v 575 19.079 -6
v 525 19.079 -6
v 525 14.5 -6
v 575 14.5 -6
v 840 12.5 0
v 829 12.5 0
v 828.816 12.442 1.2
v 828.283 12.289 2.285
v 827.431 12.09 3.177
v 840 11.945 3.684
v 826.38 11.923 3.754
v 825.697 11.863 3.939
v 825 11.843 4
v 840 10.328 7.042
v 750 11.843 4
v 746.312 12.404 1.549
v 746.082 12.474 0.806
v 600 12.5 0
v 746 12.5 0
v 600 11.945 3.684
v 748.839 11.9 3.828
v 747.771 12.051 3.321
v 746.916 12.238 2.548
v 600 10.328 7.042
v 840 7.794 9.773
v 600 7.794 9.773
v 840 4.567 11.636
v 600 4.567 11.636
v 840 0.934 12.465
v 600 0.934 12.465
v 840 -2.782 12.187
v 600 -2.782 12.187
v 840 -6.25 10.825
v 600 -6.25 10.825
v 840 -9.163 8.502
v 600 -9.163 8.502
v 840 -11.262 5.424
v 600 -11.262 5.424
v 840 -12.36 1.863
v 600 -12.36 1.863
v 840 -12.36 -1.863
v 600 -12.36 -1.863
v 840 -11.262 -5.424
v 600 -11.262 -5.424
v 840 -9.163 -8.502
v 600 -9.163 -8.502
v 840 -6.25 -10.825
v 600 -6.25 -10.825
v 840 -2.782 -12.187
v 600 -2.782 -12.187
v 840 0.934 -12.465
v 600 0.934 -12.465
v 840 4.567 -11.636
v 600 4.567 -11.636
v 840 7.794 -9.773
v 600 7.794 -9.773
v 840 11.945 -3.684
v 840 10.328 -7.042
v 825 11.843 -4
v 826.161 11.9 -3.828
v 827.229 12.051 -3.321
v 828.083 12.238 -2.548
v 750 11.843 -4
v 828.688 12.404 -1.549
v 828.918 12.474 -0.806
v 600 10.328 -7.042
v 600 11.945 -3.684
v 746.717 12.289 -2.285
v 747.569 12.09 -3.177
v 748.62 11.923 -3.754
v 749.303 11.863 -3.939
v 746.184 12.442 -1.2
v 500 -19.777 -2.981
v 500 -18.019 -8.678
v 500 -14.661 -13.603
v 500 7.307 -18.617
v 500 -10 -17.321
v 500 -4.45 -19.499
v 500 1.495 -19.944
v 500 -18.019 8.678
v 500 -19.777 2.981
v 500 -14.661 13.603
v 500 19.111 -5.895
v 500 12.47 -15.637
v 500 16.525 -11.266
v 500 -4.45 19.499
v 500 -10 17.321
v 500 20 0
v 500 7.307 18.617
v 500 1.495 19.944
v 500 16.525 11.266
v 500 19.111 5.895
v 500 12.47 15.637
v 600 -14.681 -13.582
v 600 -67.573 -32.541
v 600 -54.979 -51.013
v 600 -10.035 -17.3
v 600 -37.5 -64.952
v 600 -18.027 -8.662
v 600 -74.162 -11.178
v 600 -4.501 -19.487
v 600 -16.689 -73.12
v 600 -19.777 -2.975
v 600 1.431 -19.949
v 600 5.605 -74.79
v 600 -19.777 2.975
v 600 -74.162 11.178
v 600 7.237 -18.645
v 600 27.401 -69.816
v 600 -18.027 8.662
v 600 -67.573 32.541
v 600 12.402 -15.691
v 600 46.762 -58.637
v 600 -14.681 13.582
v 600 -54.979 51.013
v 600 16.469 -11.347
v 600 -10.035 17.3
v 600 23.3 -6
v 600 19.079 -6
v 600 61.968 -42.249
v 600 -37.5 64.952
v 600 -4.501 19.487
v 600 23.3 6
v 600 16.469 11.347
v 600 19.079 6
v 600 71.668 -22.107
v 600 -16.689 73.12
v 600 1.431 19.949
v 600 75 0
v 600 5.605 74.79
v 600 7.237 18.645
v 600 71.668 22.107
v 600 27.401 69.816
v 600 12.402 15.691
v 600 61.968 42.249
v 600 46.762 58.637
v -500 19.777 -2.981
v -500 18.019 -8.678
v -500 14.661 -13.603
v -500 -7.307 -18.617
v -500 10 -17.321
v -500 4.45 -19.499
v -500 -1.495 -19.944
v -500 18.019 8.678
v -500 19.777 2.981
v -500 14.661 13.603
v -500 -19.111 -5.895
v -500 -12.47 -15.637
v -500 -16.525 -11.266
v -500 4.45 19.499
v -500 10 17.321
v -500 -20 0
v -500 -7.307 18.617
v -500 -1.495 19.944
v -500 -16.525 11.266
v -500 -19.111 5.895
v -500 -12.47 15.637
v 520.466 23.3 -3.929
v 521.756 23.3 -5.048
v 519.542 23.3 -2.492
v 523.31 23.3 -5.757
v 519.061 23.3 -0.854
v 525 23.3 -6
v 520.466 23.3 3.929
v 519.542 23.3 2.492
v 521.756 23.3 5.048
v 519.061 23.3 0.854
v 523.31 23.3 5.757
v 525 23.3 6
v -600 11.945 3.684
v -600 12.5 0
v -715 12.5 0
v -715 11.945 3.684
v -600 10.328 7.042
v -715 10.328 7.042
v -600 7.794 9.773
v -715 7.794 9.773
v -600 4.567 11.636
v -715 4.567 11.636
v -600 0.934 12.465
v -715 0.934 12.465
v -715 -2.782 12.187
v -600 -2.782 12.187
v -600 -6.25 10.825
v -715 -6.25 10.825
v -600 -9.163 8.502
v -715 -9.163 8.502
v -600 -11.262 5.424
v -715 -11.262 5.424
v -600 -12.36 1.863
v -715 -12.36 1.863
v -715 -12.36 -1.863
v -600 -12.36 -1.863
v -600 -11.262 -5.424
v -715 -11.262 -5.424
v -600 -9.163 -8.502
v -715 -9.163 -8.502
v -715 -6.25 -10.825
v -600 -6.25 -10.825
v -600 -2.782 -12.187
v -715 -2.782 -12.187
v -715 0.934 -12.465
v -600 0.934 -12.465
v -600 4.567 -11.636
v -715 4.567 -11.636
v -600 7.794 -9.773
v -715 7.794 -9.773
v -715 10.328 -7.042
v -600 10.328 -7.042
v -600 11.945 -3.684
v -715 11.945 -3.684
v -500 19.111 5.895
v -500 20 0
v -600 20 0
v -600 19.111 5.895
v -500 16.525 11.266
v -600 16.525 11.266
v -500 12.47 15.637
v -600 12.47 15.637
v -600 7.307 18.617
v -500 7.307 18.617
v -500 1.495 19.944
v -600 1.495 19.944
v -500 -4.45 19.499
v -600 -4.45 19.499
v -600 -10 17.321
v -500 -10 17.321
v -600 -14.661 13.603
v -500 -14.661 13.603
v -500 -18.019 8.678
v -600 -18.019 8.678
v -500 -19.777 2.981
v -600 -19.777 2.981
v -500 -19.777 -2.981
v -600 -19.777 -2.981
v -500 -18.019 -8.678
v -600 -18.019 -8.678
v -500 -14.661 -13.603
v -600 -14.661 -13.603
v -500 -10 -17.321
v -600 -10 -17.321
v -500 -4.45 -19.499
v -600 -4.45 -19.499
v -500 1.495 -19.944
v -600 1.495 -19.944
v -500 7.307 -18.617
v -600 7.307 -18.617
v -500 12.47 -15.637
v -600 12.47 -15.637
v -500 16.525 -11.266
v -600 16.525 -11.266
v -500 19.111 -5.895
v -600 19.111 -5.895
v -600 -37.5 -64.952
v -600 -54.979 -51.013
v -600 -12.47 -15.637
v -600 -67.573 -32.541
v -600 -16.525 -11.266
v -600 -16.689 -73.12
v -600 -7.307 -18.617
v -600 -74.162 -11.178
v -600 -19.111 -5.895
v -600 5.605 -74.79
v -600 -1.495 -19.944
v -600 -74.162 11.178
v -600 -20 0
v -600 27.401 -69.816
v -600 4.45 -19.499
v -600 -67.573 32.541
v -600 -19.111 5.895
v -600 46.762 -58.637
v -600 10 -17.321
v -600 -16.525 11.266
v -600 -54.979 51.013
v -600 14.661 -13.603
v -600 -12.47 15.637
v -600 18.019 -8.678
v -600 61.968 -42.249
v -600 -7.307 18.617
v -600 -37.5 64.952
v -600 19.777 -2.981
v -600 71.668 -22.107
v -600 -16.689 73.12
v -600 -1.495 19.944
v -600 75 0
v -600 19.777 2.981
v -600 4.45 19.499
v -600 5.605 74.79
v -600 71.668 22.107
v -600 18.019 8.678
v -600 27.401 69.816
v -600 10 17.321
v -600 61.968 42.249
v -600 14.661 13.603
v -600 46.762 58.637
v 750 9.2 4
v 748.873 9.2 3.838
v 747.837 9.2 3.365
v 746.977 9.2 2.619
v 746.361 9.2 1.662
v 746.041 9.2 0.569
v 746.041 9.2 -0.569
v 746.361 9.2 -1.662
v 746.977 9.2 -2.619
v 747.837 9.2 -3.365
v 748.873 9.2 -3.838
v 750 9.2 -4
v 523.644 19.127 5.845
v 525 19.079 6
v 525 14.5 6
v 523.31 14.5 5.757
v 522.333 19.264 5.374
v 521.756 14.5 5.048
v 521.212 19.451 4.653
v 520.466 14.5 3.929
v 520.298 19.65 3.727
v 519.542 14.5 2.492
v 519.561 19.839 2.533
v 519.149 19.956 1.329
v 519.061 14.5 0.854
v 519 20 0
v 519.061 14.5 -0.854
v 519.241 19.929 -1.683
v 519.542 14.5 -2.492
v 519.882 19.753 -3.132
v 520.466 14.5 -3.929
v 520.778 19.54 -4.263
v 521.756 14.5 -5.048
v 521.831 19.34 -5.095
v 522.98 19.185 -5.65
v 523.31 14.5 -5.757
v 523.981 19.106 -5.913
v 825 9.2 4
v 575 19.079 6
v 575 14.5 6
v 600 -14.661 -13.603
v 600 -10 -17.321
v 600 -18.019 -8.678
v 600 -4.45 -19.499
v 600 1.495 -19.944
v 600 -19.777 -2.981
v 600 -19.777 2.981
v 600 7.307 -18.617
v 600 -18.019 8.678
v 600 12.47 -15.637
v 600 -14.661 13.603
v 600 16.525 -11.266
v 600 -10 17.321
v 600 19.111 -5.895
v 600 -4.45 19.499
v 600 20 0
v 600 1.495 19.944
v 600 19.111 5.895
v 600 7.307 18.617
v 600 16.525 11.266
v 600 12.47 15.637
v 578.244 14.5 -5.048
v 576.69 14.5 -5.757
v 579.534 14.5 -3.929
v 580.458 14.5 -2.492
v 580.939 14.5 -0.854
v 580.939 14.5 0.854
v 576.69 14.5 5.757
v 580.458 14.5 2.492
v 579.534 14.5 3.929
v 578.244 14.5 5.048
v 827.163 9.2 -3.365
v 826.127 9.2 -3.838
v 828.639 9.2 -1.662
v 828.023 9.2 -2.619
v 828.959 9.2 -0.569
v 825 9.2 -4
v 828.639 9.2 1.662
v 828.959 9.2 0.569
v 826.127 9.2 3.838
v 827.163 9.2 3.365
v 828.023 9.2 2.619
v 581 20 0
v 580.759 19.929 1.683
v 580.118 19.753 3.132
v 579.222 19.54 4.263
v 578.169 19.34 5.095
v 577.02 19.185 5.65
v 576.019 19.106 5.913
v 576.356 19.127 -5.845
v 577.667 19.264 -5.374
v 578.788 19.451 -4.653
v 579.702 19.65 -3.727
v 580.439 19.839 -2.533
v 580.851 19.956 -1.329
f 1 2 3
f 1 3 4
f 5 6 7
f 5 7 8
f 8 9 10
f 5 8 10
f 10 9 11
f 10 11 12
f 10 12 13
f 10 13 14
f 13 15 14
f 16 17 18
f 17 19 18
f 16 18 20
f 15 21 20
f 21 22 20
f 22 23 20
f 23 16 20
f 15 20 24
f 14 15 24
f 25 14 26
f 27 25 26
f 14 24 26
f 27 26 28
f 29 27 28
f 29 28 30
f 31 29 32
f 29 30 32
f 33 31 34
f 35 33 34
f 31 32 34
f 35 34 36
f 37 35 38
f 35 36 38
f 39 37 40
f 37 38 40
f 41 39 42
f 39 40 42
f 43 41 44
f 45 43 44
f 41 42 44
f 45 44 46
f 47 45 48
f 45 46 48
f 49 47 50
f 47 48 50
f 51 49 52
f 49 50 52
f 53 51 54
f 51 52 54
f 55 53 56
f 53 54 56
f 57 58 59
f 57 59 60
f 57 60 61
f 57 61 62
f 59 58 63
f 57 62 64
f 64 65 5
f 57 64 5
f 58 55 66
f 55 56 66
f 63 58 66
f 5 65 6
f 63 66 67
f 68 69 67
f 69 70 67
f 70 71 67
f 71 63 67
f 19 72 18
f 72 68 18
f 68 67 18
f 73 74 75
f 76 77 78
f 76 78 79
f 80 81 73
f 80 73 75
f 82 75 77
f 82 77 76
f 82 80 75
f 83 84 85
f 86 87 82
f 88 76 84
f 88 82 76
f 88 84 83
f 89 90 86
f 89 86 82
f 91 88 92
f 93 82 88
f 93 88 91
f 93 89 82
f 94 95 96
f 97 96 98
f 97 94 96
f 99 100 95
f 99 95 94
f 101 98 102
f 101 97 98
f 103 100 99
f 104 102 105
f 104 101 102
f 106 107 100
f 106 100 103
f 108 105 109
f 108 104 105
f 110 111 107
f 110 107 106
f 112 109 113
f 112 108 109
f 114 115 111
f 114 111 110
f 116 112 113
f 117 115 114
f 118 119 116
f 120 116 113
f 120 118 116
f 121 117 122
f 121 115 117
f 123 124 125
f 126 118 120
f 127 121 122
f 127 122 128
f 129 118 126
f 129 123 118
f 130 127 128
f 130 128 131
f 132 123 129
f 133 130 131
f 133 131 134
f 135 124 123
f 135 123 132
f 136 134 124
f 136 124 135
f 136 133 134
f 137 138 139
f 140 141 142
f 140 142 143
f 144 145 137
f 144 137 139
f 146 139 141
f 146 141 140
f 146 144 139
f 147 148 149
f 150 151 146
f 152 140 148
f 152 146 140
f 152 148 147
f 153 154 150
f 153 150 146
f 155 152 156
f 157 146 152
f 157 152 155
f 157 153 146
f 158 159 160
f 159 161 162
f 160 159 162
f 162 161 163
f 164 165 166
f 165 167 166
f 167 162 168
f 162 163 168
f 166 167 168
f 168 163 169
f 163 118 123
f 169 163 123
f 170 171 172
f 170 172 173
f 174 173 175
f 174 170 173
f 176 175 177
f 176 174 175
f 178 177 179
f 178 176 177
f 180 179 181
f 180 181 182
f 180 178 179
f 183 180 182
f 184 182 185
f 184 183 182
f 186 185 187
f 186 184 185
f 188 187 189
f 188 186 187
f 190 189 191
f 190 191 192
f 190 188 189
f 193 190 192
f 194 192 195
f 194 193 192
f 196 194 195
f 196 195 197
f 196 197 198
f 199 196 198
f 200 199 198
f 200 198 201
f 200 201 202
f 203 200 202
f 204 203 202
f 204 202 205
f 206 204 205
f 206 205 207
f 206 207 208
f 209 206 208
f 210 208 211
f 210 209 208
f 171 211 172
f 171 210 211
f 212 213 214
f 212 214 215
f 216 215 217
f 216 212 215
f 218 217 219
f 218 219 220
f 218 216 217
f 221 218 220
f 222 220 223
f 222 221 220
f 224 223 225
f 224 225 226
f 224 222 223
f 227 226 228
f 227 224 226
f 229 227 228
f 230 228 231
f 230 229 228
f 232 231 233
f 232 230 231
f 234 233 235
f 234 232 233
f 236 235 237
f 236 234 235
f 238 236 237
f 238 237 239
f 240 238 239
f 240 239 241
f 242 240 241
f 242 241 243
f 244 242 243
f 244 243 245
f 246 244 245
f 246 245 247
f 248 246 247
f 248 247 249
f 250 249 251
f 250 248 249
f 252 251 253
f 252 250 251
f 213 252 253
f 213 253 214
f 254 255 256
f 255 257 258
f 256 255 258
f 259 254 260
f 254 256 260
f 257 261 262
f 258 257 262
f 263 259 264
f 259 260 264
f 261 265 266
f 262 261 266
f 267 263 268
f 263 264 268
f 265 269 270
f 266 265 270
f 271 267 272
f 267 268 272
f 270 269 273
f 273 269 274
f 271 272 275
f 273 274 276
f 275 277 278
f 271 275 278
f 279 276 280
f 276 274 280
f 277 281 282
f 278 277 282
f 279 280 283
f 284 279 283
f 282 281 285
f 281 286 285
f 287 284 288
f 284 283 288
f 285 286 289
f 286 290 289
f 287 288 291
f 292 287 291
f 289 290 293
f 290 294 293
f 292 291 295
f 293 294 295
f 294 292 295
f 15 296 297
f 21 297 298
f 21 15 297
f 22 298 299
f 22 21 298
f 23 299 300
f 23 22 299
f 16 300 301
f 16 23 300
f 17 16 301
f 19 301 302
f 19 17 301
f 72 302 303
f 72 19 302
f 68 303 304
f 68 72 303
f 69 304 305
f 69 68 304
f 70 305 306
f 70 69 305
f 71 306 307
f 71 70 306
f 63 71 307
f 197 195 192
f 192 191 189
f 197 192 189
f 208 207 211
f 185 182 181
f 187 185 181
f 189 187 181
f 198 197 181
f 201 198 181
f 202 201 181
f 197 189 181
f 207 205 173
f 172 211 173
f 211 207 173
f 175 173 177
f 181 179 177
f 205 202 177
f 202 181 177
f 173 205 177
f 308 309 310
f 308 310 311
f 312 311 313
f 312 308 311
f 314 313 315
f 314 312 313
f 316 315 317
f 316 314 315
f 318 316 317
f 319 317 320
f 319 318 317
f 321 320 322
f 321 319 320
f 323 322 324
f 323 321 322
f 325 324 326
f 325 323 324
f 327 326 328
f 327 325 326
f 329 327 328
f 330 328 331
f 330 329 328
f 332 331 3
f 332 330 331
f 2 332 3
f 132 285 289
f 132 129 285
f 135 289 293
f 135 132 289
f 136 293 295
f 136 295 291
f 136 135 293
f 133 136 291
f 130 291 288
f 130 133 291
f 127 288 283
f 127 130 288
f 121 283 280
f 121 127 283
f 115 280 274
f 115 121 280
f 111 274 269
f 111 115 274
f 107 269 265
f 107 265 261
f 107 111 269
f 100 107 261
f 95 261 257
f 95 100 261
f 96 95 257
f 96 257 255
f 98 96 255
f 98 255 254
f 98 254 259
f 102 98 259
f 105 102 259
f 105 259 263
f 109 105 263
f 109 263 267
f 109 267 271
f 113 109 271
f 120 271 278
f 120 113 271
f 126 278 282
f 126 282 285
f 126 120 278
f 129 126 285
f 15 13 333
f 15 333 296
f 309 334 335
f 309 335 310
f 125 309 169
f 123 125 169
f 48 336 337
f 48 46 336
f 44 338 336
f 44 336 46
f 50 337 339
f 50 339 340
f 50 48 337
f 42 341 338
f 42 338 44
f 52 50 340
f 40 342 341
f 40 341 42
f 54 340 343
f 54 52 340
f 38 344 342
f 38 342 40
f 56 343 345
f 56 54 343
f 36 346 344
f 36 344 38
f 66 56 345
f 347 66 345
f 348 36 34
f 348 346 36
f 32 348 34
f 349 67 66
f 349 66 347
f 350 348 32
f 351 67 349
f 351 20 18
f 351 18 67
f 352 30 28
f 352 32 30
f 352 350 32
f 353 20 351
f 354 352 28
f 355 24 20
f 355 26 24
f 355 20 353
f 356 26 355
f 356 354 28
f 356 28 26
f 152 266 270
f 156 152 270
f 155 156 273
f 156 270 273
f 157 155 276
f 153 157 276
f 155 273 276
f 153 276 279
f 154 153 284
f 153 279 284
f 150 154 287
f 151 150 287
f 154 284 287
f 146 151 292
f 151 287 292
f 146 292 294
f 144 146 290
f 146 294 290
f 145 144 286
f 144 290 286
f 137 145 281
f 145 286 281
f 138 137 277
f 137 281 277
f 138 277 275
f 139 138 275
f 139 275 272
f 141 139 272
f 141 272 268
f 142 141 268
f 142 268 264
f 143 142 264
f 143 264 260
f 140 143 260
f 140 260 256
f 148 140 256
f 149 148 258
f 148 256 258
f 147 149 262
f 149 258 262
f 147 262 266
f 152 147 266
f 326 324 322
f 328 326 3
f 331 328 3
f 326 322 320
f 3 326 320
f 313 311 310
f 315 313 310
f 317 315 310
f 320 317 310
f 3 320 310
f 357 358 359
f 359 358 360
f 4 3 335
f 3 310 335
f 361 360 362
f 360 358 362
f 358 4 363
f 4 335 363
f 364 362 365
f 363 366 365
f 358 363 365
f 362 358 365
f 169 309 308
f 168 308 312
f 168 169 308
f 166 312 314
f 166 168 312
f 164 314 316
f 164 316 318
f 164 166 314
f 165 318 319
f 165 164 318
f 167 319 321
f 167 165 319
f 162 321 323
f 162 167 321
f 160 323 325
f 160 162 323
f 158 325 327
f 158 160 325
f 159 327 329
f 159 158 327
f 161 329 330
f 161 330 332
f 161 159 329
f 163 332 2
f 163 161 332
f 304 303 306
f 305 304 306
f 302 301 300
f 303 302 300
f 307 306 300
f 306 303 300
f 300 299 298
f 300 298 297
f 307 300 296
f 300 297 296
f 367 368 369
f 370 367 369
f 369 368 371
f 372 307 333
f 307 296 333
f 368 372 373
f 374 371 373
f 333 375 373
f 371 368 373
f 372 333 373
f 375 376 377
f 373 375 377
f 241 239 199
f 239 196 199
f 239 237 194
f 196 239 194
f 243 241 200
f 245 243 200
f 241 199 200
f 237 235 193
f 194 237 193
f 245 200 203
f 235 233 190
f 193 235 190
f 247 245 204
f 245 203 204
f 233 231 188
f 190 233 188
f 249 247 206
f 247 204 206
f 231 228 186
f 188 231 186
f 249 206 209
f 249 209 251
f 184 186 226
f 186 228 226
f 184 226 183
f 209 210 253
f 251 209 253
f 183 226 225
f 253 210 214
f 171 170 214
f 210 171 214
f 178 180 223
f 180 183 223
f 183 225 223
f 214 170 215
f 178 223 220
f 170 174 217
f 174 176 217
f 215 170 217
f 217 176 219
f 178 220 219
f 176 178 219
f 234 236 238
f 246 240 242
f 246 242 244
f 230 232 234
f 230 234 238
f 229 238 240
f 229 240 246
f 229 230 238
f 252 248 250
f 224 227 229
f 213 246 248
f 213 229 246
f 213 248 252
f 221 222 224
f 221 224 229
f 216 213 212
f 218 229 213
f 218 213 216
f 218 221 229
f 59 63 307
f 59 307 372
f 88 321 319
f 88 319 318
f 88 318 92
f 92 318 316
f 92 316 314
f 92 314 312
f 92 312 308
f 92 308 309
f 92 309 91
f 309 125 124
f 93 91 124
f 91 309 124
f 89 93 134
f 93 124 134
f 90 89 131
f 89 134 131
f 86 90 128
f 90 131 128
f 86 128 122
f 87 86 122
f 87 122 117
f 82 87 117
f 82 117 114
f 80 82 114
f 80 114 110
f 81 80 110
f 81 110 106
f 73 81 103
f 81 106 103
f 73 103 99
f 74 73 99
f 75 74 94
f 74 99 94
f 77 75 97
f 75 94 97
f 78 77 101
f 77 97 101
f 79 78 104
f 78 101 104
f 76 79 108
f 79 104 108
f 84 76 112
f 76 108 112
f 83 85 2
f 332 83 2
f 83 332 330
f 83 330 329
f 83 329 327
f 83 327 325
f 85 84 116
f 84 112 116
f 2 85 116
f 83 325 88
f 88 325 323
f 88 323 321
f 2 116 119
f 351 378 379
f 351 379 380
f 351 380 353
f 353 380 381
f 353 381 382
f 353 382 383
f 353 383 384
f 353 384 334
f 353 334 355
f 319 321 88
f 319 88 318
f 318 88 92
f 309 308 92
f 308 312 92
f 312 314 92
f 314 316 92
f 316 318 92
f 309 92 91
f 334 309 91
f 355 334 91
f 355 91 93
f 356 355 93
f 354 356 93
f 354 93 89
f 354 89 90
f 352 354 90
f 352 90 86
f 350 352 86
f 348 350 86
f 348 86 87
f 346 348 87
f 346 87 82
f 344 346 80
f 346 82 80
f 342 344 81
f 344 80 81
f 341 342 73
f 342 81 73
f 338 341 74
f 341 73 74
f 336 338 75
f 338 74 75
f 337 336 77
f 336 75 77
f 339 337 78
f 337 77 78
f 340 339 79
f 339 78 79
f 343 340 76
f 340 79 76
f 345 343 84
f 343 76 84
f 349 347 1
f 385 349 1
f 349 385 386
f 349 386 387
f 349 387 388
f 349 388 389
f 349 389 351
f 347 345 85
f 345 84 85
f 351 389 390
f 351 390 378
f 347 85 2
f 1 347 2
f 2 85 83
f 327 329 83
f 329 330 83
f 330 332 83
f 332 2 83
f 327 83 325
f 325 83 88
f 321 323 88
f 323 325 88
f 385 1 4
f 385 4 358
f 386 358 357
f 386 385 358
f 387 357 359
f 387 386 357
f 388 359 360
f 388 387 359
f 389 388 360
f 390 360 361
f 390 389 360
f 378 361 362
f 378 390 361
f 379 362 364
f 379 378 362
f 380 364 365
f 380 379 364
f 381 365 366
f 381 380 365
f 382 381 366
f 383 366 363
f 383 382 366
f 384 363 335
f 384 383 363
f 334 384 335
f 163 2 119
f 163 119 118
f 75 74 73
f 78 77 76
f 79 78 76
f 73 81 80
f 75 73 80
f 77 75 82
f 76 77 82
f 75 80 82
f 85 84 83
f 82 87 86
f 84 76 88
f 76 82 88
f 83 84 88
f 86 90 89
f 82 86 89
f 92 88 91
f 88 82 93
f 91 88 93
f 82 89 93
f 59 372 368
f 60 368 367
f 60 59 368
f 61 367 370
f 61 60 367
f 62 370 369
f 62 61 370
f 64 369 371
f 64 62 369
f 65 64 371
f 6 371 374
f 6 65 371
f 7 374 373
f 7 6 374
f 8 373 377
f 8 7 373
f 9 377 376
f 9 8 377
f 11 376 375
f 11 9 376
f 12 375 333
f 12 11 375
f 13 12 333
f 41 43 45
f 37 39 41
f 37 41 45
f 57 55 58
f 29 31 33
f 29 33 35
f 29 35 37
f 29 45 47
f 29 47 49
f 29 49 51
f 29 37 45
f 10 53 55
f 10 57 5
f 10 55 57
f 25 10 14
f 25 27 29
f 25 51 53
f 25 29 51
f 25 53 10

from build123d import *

# Parameters (mm, degrees)
F0_R       = 75
F1_DEPTH   = 600
F2_R       = 20
F3_DEPTH   = 100
F4_R       = 20
F5_DEPTH   = 100
F6_W       = 4.221216
F6_H       = 12
F7_DEPTH   = 75
F8_R       = 20
F9_DEPTH   = 100
F10_R      = 12.5
F11_DEPTH  = 115
F14_DEPTH  = 8.8
F11_FACE_R = 12.5
F15_DEPTH  = 125
F18_DEPTH  = 3.3


with BuildPart() as f1:
    # F0 (on Right) → F1 (new body, symmetric)
    with BuildSketch(Plane.YZ):
        Circle(F0_R)
    extrude(amount=F1_DEPTH, both=True)

    # F2 (on face) → F3 (cut)
    with BuildSketch(Plane(origin=(-600, 0, 0), x_dir=(0, -1, 0), z_dir=(-1, 0, 0))):
        Circle(F2_R)
    extrude(amount=-F3_DEPTH, mode=Mode.SUBTRACT)

    # F4 (on face) → F5 (cut)
    with BuildSketch(Plane.YZ.offset(600)):
        Circle(F4_R)
    extrude(amount=-F5_DEPTH, mode=Mode.SUBTRACT)

    # F6 (on face) → F7 (cut)
    with BuildSketch(Plane.YZ.offset(600)):
        with Locations((21.189392, 0)):
            Rectangle(F6_W, F6_H)
    extrude(amount=-F7_DEPTH, mode=Mode.SUBTRACT)


with BuildPart() as f9:
    # F8 (on face) → F9 (new body)
    with BuildSketch(Plane.YZ.offset(500)):
        Circle(F8_R)
    extrude(amount=F9_DEPTH)

    # F10 (on face) → F11 (join)
    with BuildSketch(Plane.YZ.offset(600)):
        Circle(F10_R)
    extrude(amount=F11_DEPTH)


with BuildPart() as f12_1:
    # F12: instance of F9
    add(f9.part.mirror(Plane.YZ))


with BuildPart() as f14_tool:
    # F13 (on face) → F14 (new body)
    with BuildSketch(Plane.XZ.offset(-23.3)):
        with BuildLine():
            ThreePointArc((525, 6), (519, 0), (525, -6))
            Line((525, -6), (575, -6))
            ThreePointArc((575, -6), (581, 0), (575, 6))
            Line((575, 6), (525, 6))
        make_face()
    extrude(amount=F14_DEPTH)


with BuildPart() as f1_1:
    add(f1.part)

    # F14: cut by f14_tool
    add(f14_tool.part, mode=Mode.SUBTRACT)


with BuildPart() as f9_1:
    add(f9.part)

    # F14: cut by f14_tool
    add(f14_tool.part, mode=Mode.SUBTRACT)

    # F11_face (on face) → F15 (join)
    with BuildSketch(Plane.YZ.offset(715)):
        Circle(F11_FACE_R)
    extrude(amount=F15_DEPTH)

    # F17 (on offset) → F18 (cut)
    with BuildSketch(Plane.XZ.offset(-12.5)):
        with BuildLine():
            ThreePointArc((825, -4), (829, 0), (825, 4))
            Line((825, 4), (750, 4))
            ThreePointArc((750, 4), (746, 0), (750, -4))
            Line((750, -4), (825, -4))
        make_face()
    extrude(amount=F18_DEPTH, mode=Mode.SUBTRACT)


solid = Compound([f12_1.part, f1_1.part, f9_1.part])
